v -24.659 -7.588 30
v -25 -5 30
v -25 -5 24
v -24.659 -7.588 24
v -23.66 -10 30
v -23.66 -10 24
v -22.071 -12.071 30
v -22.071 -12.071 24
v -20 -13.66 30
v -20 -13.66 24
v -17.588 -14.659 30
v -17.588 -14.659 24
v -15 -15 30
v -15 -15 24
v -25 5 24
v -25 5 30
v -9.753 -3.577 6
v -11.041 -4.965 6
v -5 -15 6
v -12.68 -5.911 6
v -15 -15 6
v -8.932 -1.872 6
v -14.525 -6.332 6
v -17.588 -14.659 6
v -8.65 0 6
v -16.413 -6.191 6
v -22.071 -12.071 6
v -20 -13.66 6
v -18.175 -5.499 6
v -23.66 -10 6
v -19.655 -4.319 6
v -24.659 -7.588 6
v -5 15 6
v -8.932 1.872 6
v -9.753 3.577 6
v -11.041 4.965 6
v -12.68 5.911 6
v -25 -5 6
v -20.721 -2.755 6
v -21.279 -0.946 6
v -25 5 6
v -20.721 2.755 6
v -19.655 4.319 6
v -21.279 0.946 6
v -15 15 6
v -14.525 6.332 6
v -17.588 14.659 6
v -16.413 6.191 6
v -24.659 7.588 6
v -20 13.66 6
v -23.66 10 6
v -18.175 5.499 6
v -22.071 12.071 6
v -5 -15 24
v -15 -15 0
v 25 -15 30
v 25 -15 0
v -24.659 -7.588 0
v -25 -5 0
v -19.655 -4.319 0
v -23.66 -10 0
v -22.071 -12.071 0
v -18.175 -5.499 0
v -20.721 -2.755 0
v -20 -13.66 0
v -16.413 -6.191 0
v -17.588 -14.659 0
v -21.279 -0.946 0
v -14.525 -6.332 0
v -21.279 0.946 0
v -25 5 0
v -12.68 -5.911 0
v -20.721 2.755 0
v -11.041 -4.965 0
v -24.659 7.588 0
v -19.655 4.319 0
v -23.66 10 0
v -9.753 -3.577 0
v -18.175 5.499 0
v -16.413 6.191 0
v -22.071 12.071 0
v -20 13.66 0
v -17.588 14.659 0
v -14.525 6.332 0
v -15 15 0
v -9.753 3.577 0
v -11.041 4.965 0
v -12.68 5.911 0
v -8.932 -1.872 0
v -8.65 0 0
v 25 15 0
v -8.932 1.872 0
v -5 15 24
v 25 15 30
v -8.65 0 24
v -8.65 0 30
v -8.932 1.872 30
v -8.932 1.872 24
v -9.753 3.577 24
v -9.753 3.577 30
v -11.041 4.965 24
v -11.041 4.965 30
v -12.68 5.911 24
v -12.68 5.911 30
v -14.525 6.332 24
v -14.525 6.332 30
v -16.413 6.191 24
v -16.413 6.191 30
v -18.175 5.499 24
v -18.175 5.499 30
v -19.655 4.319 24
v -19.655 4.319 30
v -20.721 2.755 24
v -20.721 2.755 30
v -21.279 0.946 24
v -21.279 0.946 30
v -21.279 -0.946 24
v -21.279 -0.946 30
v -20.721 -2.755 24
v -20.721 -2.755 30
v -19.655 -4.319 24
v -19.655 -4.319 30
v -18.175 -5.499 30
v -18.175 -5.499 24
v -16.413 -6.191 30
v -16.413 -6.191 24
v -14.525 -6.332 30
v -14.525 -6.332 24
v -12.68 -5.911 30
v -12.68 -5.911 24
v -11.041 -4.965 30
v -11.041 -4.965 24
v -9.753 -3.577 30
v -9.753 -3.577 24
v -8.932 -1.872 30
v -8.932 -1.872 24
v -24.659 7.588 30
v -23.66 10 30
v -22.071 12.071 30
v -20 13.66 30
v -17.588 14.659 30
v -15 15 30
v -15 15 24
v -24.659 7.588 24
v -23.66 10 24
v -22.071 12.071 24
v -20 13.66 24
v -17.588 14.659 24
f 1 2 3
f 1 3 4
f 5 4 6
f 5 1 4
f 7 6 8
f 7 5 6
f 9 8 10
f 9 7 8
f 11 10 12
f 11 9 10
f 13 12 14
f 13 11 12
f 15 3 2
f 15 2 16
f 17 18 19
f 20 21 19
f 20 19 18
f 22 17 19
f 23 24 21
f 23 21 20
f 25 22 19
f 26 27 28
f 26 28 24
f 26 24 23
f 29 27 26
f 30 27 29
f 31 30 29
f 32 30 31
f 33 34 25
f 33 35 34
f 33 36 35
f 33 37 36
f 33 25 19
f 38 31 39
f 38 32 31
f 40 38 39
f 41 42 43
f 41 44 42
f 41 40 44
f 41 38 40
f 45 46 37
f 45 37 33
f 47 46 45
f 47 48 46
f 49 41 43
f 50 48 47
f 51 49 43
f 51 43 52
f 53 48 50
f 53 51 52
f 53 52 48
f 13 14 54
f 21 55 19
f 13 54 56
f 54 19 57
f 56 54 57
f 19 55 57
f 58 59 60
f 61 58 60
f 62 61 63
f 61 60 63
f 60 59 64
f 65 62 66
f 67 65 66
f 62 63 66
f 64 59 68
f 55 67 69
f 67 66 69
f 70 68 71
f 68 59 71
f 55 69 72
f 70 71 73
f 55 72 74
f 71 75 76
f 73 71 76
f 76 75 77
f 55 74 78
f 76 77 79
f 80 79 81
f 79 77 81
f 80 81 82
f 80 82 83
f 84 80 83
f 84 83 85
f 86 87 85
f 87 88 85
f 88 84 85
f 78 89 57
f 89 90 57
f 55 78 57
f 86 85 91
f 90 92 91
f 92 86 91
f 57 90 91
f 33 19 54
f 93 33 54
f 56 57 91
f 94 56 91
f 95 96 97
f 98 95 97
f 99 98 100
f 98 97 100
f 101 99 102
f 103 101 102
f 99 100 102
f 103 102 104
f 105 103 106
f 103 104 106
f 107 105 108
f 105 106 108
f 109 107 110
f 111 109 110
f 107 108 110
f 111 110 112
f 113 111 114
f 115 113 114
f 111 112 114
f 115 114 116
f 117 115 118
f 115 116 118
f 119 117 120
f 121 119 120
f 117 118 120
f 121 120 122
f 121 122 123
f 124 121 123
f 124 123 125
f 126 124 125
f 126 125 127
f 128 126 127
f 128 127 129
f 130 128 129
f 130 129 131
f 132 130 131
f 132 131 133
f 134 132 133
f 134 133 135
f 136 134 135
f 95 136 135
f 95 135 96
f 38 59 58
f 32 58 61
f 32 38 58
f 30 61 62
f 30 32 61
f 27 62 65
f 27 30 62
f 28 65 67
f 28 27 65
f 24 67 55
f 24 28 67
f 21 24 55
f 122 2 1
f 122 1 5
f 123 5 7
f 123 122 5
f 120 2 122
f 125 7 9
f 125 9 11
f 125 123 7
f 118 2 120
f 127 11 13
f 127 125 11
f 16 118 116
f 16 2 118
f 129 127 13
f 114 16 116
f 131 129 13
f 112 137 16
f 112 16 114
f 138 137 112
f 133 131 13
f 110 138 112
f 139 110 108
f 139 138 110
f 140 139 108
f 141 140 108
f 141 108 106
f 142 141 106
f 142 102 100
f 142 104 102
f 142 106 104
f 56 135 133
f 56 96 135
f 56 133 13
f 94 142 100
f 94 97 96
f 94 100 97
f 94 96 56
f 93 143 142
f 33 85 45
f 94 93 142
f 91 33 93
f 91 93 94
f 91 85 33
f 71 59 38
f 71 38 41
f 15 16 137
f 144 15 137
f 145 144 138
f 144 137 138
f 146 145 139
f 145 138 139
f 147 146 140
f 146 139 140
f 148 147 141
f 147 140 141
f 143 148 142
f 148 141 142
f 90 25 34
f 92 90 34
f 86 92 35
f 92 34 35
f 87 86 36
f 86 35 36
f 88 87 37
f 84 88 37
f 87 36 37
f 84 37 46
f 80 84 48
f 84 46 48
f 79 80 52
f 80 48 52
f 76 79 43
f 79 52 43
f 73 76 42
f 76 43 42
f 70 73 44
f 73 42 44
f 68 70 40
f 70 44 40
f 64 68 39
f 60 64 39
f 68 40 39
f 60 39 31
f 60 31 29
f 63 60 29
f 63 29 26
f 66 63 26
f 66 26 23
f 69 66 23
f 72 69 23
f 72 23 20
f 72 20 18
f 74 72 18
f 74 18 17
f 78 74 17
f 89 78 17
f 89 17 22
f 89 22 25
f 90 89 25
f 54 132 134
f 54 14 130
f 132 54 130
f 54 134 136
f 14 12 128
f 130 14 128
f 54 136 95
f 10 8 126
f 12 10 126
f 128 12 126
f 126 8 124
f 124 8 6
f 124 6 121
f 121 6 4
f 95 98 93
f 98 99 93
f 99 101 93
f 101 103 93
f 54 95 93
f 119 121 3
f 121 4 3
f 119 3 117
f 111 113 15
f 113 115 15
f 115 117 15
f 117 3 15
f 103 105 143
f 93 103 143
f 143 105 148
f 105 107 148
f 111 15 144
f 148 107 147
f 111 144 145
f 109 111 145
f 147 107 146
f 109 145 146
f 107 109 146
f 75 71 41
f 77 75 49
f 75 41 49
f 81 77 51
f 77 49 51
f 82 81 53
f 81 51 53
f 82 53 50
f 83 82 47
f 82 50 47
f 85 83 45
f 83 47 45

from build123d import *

# Parameters (mm, degrees)
ESQUISSE1_W             = 50
ESQUISSE1_H             = 30
BOSS_EXTRU_1_DEPTH      = 30
ENL_V_MAT_EXTRU_1_REACH = 43.833
ESQUISSE2_R             = 6.35
CONG_1_R                = 10
ESQUISSE3_W             = 18
ESQUISSE3_H             = 30
ENL_V_MAT_EXTRU_2_DEPTH = 20


with BuildPart() as part:
    # Esquisse1 → Boss.-Extru.1 (new body)
    with BuildSketch(Plane.XY):
        Rectangle(ESQUISSE1_W, ESQUISSE1_H)
    extrude(amount=BOSS_EXTRU_1_DEPTH)

    # Esquisse2 → Enlèv. mat.-Extru.1 (cut, up to next)
    with BuildSketch(Plane.XY.offset(30), mode=Mode.PRIVATE) as enl_v_mat_extru_1_sk1:
        with Locations((-15, 0)):
            Circle(ESQUISSE2_R)
    enl_v_mat_extru_1_tool1 = extrude(enl_v_mat_extru_1_sk1.sketch, amount=-ENL_V_MAT_EXTRU_1_REACH, mode=Mode.PRIVATE) & part.part
    add(enl_v_mat_extru_1_tool1.solids().sort_by_distance((-15, 0, 30))[0], mode=Mode.SUBTRACT)

    # Congé1
    cong_1_edges = [part.edges().sort_by_distance(p)[0] for p in [
        (-25, -15, 15),
        (-25, 15, 15),
    ]]
    fillet(cong_1_edges, radius=CONG_1_R)

    # Esquisse3 → Enlèv. mat.-Extru.2 (cut)
    with BuildSketch(Plane.ZY.offset(25)):
        with Locations((15, 0)):
            Rectangle(ESQUISSE3_W, ESQUISSE3_H)
    extrude(amount=-ENL_V_MAT_EXTRU_2_DEPTH, mode=Mode.SUBTRACT)


solid = part.part
